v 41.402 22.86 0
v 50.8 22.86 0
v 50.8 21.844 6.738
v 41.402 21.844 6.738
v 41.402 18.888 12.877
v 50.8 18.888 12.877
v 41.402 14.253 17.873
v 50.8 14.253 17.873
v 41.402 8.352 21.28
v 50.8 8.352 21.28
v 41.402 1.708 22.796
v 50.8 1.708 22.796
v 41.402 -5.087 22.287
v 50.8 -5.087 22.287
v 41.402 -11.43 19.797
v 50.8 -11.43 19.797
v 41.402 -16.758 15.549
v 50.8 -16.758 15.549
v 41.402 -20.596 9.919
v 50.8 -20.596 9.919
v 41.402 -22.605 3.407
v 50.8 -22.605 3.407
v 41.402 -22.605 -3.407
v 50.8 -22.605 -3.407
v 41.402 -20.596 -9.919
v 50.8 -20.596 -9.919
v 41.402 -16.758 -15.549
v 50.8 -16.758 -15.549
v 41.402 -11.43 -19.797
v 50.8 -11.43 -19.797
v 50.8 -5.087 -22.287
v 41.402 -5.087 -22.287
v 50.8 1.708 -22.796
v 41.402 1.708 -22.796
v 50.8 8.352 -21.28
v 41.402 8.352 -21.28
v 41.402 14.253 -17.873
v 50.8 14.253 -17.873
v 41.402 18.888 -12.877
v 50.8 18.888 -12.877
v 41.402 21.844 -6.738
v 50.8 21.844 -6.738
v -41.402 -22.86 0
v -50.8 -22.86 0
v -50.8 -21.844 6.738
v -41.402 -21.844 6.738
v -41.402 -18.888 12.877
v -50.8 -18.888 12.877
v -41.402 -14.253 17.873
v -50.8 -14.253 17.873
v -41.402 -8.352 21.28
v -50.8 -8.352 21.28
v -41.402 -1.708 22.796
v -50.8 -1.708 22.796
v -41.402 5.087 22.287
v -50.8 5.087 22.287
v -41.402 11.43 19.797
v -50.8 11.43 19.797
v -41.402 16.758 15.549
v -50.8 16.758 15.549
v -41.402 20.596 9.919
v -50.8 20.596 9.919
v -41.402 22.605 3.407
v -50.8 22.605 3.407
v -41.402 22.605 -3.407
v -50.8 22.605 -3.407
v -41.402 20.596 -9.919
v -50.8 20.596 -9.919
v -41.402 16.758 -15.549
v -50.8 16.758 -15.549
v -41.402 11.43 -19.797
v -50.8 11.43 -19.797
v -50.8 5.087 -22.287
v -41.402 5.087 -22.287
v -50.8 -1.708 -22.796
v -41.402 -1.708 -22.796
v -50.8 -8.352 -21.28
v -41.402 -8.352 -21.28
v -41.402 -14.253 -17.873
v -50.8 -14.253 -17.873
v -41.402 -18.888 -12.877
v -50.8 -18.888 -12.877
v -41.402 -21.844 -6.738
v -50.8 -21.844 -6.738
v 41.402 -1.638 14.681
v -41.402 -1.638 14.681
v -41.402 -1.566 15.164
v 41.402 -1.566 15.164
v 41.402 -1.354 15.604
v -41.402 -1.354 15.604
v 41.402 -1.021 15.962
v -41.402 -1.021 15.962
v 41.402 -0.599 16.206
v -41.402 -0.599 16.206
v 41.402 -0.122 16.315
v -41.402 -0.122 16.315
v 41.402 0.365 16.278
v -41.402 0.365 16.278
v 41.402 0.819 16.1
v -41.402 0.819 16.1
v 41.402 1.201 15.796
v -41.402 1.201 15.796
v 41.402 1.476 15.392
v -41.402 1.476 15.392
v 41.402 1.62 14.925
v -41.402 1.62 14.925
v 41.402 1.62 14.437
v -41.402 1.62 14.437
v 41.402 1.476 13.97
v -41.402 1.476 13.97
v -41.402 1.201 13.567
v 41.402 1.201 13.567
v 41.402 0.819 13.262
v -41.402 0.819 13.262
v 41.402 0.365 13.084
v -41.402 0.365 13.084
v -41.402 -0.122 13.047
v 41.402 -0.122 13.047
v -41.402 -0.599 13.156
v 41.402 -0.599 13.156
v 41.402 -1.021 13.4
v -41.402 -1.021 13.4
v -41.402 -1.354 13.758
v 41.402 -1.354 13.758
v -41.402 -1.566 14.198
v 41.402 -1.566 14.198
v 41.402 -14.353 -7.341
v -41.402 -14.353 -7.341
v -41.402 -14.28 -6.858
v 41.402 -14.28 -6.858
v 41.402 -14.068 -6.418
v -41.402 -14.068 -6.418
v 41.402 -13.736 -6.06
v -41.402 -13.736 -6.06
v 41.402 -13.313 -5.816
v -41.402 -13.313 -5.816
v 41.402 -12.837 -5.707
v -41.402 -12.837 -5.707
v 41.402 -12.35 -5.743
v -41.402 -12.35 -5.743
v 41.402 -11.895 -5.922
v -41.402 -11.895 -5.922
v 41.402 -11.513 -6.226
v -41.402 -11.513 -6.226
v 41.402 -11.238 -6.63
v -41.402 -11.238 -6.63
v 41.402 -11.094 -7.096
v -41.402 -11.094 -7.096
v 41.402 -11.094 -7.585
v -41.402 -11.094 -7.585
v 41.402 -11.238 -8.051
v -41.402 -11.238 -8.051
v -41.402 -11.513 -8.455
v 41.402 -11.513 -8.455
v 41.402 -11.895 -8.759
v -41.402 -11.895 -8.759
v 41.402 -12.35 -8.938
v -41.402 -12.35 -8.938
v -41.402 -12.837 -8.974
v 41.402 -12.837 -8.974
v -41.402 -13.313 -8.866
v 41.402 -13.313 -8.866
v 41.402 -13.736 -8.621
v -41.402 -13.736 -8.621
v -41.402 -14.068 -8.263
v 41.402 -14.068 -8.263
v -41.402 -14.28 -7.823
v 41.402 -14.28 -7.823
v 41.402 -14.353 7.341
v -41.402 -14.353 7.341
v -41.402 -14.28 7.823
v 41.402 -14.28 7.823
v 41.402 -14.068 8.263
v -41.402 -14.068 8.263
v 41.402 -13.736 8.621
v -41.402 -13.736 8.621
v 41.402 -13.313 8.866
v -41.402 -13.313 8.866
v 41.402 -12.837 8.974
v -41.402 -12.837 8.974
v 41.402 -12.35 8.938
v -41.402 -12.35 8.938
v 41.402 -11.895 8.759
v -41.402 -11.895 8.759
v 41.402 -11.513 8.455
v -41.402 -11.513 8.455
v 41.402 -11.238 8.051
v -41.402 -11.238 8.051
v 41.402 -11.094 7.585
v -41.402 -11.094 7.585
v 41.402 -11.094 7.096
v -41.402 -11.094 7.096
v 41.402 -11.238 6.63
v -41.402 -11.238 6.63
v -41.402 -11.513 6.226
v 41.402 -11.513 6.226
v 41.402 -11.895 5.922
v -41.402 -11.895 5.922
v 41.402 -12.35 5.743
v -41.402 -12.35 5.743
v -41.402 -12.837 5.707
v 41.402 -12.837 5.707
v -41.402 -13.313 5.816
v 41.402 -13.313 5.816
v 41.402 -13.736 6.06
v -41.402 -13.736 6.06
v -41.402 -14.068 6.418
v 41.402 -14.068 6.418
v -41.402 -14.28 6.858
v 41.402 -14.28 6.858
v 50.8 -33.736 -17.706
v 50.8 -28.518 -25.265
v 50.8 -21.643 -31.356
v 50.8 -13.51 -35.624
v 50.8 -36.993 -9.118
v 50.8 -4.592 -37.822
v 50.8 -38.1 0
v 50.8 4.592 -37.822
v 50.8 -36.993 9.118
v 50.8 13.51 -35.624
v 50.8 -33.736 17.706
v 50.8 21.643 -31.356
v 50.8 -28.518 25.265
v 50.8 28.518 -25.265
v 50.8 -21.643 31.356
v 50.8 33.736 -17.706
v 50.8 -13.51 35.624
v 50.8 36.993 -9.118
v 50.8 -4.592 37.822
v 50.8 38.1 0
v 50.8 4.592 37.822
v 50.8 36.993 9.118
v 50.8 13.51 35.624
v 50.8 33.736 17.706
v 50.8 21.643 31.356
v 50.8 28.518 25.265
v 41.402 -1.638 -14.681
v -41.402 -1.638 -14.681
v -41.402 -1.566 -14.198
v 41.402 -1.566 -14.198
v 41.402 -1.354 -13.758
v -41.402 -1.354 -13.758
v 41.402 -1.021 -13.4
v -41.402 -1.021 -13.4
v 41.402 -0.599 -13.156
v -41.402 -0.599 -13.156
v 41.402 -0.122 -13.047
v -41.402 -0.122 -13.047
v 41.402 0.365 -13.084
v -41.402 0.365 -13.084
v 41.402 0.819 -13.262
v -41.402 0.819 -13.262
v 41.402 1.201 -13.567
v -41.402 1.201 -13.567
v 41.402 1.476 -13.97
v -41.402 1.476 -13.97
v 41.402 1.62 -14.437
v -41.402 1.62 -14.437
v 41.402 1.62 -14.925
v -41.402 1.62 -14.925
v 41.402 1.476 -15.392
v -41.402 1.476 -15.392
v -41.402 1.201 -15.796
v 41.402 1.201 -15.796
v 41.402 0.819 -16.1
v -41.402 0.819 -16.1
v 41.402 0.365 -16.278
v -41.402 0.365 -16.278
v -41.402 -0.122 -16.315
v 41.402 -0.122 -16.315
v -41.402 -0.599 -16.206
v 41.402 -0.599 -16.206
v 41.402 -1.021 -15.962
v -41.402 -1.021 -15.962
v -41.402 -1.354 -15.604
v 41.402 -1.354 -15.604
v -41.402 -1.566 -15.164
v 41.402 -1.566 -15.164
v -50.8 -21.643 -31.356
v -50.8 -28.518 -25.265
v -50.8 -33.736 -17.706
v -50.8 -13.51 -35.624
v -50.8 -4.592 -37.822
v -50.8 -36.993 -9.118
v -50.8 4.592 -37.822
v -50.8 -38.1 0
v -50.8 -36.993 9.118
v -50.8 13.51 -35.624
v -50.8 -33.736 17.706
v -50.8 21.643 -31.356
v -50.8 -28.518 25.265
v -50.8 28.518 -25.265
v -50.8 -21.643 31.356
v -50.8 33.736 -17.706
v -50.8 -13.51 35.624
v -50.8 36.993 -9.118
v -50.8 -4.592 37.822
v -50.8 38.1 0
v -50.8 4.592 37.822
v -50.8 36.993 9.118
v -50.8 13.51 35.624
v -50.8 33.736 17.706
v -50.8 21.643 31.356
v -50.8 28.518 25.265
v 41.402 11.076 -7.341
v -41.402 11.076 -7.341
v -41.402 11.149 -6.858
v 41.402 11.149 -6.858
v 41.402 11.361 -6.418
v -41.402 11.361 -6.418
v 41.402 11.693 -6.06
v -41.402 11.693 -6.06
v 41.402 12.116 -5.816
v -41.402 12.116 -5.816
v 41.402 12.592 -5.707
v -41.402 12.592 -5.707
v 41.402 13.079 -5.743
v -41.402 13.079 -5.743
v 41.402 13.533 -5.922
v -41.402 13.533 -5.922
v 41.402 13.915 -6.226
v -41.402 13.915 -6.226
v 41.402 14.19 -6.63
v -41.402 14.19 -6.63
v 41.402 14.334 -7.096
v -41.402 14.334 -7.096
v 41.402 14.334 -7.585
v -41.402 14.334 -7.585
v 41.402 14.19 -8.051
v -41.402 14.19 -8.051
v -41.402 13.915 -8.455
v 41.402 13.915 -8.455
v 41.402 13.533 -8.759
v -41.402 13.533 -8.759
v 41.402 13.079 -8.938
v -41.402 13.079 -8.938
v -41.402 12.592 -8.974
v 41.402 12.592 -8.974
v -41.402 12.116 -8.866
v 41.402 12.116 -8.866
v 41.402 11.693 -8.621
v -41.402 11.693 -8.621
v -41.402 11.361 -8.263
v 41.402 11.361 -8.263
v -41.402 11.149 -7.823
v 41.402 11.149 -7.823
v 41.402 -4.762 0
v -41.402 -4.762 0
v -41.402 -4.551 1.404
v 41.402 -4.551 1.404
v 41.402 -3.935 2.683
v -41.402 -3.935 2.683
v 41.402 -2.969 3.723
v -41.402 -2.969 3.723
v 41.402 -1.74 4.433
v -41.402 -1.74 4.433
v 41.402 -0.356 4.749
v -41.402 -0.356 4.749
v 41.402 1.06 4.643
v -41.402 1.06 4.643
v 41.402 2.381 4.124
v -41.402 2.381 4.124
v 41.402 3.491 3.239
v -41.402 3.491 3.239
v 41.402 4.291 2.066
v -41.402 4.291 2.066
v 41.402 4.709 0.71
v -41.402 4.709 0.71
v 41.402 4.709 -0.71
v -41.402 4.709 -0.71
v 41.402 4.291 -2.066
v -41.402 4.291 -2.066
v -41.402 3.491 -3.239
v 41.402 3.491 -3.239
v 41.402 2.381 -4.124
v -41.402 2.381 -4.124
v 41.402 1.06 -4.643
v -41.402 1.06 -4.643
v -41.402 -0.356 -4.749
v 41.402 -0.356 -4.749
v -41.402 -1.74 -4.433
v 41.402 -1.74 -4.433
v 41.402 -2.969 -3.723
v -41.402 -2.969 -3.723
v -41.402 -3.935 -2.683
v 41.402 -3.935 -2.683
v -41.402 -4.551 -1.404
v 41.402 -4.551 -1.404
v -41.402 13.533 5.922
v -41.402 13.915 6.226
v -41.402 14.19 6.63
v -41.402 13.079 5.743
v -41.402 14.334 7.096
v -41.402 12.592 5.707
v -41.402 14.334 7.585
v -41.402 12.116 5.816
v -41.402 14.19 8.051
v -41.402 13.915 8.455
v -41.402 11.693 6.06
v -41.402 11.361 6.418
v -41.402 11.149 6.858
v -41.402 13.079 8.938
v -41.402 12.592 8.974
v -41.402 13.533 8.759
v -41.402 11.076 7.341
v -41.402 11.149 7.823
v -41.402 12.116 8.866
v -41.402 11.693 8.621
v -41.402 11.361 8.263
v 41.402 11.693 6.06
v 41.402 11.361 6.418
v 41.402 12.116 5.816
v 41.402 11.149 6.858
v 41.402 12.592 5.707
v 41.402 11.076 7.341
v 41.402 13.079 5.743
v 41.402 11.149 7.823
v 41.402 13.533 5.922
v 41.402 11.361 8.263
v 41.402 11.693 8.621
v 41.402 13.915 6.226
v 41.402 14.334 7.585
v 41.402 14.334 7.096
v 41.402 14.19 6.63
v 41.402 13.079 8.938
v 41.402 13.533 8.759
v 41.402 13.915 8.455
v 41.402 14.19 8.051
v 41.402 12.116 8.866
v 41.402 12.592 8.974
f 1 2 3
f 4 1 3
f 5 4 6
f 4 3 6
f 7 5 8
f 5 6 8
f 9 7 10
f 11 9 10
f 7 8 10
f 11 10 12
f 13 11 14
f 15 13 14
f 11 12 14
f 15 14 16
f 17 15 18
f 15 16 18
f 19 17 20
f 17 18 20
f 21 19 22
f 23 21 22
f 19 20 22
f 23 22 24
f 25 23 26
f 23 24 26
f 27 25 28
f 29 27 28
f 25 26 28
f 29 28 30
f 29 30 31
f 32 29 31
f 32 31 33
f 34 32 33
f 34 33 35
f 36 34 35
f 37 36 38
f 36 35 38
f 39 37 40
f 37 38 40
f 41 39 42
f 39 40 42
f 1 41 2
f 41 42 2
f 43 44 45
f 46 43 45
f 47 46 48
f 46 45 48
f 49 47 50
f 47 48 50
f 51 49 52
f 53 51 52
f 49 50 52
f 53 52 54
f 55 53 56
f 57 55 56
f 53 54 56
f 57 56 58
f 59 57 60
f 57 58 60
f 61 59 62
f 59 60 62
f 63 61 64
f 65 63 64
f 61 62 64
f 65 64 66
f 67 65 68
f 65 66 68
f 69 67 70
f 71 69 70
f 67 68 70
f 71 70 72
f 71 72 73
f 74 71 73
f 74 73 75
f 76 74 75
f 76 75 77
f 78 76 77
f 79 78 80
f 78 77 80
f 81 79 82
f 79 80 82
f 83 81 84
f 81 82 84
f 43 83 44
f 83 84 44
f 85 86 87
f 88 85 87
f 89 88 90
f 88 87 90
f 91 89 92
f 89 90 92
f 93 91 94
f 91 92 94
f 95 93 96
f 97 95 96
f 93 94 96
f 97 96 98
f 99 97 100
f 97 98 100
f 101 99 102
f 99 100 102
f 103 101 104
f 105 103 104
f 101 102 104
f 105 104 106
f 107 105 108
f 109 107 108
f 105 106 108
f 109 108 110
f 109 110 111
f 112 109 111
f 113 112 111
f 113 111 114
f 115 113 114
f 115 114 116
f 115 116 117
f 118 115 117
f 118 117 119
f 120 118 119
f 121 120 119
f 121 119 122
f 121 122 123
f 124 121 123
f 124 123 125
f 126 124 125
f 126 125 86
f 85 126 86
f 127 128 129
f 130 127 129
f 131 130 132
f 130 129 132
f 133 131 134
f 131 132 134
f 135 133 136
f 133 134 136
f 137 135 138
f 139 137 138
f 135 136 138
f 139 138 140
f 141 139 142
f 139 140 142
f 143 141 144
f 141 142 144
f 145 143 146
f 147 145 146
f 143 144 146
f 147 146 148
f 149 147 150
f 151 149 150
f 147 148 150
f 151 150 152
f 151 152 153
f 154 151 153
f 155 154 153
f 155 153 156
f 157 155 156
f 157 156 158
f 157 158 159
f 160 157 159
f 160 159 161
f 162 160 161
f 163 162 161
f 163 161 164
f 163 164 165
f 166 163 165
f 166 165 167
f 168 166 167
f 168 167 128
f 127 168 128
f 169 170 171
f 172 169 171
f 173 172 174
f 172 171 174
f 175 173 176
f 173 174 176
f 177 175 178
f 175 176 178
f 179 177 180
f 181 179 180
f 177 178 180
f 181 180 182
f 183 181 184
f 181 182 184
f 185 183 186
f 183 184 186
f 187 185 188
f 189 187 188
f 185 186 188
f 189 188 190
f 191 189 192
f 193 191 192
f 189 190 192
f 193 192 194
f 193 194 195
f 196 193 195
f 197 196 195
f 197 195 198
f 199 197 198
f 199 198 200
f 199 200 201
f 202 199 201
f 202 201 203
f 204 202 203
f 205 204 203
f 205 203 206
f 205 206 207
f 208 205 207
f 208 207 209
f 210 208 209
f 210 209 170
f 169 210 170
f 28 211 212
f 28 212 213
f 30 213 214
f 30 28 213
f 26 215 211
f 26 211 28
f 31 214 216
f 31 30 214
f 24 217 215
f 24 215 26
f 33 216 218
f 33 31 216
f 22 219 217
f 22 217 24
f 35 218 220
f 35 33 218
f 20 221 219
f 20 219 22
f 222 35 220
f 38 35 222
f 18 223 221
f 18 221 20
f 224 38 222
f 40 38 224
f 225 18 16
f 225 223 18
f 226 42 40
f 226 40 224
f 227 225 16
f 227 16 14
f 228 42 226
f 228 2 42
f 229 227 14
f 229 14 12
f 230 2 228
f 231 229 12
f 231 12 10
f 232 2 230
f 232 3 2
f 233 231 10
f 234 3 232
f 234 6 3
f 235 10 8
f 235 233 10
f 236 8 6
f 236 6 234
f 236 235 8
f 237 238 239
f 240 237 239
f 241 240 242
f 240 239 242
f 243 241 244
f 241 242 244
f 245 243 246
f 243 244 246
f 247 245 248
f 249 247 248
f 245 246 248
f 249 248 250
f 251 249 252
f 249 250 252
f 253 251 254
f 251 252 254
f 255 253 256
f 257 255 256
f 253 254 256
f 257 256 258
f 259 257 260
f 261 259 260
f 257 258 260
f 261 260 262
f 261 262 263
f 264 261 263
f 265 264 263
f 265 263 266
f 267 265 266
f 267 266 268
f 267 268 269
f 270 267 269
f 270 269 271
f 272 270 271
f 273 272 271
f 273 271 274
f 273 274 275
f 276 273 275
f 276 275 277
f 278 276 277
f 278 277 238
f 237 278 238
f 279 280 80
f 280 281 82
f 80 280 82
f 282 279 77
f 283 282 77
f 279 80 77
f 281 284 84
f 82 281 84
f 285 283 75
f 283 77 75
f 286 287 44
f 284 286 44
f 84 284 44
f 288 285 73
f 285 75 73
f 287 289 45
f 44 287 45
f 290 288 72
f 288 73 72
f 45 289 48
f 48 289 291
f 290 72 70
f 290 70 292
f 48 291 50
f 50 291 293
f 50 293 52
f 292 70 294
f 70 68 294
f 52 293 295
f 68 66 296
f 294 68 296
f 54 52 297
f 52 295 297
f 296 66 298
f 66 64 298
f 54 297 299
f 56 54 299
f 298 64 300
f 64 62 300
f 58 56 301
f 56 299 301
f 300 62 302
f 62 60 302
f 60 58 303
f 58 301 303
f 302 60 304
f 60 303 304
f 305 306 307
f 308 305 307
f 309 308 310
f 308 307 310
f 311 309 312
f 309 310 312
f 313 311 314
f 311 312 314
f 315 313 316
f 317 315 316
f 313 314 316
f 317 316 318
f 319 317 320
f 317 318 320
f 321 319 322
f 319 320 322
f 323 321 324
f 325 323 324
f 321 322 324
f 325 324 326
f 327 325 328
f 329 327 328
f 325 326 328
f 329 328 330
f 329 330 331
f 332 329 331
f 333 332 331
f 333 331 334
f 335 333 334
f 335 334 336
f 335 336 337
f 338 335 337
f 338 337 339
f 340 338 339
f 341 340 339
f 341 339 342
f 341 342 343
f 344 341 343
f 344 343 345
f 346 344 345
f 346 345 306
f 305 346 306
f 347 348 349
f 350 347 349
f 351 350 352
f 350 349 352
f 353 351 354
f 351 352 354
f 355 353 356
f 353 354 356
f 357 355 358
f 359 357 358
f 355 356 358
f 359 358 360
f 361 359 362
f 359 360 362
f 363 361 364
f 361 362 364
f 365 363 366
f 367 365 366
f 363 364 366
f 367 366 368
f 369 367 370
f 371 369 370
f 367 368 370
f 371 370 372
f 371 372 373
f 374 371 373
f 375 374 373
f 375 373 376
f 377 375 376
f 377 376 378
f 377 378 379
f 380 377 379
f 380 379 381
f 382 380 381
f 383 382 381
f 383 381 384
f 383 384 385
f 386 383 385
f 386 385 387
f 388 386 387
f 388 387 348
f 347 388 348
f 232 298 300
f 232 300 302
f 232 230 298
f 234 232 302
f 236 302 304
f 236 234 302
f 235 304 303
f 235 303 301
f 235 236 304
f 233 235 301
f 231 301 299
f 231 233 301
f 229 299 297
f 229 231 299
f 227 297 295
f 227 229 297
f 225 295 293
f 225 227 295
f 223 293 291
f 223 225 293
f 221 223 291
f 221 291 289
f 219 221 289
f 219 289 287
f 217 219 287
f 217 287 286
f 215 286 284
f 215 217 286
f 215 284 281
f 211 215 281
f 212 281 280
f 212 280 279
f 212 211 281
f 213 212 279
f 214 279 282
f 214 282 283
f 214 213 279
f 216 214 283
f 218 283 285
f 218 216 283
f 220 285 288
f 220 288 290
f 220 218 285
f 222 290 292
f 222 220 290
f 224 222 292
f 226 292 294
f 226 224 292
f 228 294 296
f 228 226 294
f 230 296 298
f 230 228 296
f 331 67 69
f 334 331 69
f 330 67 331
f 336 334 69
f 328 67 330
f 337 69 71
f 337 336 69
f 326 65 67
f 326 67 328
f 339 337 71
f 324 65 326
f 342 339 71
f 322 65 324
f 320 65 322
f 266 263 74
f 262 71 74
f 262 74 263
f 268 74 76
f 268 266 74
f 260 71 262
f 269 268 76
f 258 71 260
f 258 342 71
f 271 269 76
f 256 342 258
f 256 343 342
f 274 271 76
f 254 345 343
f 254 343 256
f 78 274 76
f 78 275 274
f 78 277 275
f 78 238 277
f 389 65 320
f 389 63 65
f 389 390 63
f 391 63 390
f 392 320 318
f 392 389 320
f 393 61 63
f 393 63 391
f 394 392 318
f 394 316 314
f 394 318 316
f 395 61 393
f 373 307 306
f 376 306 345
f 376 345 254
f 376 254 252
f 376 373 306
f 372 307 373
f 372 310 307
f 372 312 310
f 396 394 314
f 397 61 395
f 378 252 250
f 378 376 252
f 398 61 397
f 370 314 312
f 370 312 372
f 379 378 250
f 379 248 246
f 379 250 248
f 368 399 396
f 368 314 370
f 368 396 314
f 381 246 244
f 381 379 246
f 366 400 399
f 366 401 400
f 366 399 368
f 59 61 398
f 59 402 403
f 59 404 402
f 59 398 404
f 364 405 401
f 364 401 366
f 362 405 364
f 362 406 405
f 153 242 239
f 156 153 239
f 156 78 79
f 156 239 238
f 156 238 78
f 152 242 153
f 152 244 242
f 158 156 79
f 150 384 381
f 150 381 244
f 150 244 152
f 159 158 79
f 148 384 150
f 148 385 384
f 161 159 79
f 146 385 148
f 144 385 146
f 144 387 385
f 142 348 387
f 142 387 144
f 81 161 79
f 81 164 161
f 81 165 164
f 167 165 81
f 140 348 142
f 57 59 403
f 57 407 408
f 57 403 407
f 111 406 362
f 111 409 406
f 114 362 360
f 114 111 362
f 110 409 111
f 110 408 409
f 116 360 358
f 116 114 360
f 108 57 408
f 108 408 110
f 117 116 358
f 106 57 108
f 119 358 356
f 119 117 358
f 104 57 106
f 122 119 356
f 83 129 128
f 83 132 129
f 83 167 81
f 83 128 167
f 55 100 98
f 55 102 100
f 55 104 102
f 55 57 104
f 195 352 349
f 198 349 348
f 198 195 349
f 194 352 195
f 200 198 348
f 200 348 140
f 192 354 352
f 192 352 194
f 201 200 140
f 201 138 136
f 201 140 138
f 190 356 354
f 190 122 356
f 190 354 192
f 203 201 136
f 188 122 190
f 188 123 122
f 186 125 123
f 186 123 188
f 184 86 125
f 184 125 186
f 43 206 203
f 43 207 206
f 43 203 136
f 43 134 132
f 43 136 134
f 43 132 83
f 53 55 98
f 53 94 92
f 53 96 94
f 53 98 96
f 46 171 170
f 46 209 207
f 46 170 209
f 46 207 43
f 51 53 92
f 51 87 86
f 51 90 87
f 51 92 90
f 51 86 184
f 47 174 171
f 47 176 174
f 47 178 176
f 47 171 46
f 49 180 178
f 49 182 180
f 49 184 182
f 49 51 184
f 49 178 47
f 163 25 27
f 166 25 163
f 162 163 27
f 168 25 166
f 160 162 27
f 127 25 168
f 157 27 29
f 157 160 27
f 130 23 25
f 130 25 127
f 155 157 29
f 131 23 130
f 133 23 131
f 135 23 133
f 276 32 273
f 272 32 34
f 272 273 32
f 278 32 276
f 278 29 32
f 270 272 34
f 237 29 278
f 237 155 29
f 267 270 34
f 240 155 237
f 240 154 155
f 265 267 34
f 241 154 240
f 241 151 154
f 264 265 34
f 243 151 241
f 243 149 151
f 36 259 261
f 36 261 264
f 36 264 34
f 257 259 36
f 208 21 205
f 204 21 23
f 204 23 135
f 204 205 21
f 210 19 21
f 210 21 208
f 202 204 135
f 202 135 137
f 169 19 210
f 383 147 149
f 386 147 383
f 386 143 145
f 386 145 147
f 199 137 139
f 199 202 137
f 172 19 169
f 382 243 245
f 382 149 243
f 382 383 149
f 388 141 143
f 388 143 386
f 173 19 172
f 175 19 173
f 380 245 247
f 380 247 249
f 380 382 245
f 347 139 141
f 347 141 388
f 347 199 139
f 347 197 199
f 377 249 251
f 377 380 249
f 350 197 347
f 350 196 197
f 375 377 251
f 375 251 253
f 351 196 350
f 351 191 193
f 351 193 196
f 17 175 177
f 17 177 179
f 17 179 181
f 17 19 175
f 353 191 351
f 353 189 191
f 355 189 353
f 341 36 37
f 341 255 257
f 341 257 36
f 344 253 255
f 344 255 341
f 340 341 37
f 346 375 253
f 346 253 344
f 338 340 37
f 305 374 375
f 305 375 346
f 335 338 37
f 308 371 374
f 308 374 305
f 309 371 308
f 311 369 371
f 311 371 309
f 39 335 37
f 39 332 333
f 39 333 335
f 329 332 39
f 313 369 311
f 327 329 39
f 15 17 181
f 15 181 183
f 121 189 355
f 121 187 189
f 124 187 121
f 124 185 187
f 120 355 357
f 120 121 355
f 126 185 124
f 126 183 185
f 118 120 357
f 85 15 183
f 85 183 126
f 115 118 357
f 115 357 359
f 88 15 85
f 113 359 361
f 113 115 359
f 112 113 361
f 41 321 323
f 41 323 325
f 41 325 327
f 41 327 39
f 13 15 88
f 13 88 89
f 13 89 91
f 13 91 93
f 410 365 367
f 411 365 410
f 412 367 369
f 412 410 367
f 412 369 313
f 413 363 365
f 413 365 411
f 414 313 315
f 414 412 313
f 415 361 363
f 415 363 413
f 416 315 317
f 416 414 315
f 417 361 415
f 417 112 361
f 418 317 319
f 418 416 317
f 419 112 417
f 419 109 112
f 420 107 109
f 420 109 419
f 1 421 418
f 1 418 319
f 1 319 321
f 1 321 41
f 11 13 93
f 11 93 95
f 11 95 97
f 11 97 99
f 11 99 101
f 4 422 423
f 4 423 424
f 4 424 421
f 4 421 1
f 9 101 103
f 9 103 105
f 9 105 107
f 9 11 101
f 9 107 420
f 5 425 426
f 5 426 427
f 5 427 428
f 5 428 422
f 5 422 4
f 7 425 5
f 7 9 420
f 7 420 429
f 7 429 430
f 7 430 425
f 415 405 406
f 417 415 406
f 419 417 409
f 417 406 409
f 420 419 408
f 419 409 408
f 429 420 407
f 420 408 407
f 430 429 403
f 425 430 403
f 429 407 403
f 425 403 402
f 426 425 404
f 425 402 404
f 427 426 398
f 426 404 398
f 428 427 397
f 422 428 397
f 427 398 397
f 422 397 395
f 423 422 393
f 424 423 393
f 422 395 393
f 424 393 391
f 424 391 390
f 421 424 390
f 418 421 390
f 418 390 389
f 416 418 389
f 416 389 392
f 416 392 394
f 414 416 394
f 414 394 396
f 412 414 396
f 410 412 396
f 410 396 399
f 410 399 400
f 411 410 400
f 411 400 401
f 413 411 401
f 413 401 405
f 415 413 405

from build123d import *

# Parameters (mm, degrees)
F0_R     = 38.1
F1_DEPTH = 50.8
F2_R     = 22.86
F3_DEPTH = 9.398
F4_R     = 22.86
F5_DEPTH = 9.398
F6_R     = 4.7625
F7_DEPTH = 101.601
F8_R     = 1.6383
F9_DEPTH = 92.203


with BuildPart() as f1:
    # F0 (on Right) → F1 (new body, symmetric)
    with BuildSketch(Plane.YZ):
        Circle(F0_R)
    extrude(amount=F1_DEPTH, both=True)

    # F2 (on face) → F3 (cut)
    with BuildSketch(Plane(origin=(-50.8, 0, 0), x_dir=(0, -1, 0), z_dir=(-1, 0, 0))):
        Circle(F2_R)
    extrude(amount=-F3_DEPTH, mode=Mode.SUBTRACT)

    # F4 (on face) → F5 (cut)
    with BuildSketch(Plane.YZ.offset(50.8)):
        Circle(F4_R)
    extrude(amount=-F5_DEPTH, mode=Mode.SUBTRACT)

    # F6 (on face) → F7 (cut, through all)
    with BuildSketch(Plane(origin=(-50.8, 0, 0), x_dir=(0, -1, 0), z_dir=(-1, 0, 0))):
        Circle(F6_R)
    extrude(amount=-F7_DEPTH, mode=Mode.SUBTRACT)

    # F8 (on face) → F9 (cut, through all)
    with BuildSketch(Plane(origin=(-41.402, 0, 0), x_dir=(0, -1, 0), z_dir=(-1, 0, 0))):
        with Locations((0, 14.6812)):
            Circle(F8_R)
        with Locations((12.714292, 7.3406)):
            Circle(F8_R)
        with Locations((12.714292, -7.3406)):
            Circle(F8_R)
        with Locations((0, -14.6812)):
            Circle(F8_R)
        with Locations((-12.714292, -7.3406)):
            Circle(F8_R)
        with Locations((-12.714292, 7.3406)):
            Circle(F8_R)
    extrude(amount=-F9_DEPTH, mode=Mode.SUBTRACT)


solid = f1.part
